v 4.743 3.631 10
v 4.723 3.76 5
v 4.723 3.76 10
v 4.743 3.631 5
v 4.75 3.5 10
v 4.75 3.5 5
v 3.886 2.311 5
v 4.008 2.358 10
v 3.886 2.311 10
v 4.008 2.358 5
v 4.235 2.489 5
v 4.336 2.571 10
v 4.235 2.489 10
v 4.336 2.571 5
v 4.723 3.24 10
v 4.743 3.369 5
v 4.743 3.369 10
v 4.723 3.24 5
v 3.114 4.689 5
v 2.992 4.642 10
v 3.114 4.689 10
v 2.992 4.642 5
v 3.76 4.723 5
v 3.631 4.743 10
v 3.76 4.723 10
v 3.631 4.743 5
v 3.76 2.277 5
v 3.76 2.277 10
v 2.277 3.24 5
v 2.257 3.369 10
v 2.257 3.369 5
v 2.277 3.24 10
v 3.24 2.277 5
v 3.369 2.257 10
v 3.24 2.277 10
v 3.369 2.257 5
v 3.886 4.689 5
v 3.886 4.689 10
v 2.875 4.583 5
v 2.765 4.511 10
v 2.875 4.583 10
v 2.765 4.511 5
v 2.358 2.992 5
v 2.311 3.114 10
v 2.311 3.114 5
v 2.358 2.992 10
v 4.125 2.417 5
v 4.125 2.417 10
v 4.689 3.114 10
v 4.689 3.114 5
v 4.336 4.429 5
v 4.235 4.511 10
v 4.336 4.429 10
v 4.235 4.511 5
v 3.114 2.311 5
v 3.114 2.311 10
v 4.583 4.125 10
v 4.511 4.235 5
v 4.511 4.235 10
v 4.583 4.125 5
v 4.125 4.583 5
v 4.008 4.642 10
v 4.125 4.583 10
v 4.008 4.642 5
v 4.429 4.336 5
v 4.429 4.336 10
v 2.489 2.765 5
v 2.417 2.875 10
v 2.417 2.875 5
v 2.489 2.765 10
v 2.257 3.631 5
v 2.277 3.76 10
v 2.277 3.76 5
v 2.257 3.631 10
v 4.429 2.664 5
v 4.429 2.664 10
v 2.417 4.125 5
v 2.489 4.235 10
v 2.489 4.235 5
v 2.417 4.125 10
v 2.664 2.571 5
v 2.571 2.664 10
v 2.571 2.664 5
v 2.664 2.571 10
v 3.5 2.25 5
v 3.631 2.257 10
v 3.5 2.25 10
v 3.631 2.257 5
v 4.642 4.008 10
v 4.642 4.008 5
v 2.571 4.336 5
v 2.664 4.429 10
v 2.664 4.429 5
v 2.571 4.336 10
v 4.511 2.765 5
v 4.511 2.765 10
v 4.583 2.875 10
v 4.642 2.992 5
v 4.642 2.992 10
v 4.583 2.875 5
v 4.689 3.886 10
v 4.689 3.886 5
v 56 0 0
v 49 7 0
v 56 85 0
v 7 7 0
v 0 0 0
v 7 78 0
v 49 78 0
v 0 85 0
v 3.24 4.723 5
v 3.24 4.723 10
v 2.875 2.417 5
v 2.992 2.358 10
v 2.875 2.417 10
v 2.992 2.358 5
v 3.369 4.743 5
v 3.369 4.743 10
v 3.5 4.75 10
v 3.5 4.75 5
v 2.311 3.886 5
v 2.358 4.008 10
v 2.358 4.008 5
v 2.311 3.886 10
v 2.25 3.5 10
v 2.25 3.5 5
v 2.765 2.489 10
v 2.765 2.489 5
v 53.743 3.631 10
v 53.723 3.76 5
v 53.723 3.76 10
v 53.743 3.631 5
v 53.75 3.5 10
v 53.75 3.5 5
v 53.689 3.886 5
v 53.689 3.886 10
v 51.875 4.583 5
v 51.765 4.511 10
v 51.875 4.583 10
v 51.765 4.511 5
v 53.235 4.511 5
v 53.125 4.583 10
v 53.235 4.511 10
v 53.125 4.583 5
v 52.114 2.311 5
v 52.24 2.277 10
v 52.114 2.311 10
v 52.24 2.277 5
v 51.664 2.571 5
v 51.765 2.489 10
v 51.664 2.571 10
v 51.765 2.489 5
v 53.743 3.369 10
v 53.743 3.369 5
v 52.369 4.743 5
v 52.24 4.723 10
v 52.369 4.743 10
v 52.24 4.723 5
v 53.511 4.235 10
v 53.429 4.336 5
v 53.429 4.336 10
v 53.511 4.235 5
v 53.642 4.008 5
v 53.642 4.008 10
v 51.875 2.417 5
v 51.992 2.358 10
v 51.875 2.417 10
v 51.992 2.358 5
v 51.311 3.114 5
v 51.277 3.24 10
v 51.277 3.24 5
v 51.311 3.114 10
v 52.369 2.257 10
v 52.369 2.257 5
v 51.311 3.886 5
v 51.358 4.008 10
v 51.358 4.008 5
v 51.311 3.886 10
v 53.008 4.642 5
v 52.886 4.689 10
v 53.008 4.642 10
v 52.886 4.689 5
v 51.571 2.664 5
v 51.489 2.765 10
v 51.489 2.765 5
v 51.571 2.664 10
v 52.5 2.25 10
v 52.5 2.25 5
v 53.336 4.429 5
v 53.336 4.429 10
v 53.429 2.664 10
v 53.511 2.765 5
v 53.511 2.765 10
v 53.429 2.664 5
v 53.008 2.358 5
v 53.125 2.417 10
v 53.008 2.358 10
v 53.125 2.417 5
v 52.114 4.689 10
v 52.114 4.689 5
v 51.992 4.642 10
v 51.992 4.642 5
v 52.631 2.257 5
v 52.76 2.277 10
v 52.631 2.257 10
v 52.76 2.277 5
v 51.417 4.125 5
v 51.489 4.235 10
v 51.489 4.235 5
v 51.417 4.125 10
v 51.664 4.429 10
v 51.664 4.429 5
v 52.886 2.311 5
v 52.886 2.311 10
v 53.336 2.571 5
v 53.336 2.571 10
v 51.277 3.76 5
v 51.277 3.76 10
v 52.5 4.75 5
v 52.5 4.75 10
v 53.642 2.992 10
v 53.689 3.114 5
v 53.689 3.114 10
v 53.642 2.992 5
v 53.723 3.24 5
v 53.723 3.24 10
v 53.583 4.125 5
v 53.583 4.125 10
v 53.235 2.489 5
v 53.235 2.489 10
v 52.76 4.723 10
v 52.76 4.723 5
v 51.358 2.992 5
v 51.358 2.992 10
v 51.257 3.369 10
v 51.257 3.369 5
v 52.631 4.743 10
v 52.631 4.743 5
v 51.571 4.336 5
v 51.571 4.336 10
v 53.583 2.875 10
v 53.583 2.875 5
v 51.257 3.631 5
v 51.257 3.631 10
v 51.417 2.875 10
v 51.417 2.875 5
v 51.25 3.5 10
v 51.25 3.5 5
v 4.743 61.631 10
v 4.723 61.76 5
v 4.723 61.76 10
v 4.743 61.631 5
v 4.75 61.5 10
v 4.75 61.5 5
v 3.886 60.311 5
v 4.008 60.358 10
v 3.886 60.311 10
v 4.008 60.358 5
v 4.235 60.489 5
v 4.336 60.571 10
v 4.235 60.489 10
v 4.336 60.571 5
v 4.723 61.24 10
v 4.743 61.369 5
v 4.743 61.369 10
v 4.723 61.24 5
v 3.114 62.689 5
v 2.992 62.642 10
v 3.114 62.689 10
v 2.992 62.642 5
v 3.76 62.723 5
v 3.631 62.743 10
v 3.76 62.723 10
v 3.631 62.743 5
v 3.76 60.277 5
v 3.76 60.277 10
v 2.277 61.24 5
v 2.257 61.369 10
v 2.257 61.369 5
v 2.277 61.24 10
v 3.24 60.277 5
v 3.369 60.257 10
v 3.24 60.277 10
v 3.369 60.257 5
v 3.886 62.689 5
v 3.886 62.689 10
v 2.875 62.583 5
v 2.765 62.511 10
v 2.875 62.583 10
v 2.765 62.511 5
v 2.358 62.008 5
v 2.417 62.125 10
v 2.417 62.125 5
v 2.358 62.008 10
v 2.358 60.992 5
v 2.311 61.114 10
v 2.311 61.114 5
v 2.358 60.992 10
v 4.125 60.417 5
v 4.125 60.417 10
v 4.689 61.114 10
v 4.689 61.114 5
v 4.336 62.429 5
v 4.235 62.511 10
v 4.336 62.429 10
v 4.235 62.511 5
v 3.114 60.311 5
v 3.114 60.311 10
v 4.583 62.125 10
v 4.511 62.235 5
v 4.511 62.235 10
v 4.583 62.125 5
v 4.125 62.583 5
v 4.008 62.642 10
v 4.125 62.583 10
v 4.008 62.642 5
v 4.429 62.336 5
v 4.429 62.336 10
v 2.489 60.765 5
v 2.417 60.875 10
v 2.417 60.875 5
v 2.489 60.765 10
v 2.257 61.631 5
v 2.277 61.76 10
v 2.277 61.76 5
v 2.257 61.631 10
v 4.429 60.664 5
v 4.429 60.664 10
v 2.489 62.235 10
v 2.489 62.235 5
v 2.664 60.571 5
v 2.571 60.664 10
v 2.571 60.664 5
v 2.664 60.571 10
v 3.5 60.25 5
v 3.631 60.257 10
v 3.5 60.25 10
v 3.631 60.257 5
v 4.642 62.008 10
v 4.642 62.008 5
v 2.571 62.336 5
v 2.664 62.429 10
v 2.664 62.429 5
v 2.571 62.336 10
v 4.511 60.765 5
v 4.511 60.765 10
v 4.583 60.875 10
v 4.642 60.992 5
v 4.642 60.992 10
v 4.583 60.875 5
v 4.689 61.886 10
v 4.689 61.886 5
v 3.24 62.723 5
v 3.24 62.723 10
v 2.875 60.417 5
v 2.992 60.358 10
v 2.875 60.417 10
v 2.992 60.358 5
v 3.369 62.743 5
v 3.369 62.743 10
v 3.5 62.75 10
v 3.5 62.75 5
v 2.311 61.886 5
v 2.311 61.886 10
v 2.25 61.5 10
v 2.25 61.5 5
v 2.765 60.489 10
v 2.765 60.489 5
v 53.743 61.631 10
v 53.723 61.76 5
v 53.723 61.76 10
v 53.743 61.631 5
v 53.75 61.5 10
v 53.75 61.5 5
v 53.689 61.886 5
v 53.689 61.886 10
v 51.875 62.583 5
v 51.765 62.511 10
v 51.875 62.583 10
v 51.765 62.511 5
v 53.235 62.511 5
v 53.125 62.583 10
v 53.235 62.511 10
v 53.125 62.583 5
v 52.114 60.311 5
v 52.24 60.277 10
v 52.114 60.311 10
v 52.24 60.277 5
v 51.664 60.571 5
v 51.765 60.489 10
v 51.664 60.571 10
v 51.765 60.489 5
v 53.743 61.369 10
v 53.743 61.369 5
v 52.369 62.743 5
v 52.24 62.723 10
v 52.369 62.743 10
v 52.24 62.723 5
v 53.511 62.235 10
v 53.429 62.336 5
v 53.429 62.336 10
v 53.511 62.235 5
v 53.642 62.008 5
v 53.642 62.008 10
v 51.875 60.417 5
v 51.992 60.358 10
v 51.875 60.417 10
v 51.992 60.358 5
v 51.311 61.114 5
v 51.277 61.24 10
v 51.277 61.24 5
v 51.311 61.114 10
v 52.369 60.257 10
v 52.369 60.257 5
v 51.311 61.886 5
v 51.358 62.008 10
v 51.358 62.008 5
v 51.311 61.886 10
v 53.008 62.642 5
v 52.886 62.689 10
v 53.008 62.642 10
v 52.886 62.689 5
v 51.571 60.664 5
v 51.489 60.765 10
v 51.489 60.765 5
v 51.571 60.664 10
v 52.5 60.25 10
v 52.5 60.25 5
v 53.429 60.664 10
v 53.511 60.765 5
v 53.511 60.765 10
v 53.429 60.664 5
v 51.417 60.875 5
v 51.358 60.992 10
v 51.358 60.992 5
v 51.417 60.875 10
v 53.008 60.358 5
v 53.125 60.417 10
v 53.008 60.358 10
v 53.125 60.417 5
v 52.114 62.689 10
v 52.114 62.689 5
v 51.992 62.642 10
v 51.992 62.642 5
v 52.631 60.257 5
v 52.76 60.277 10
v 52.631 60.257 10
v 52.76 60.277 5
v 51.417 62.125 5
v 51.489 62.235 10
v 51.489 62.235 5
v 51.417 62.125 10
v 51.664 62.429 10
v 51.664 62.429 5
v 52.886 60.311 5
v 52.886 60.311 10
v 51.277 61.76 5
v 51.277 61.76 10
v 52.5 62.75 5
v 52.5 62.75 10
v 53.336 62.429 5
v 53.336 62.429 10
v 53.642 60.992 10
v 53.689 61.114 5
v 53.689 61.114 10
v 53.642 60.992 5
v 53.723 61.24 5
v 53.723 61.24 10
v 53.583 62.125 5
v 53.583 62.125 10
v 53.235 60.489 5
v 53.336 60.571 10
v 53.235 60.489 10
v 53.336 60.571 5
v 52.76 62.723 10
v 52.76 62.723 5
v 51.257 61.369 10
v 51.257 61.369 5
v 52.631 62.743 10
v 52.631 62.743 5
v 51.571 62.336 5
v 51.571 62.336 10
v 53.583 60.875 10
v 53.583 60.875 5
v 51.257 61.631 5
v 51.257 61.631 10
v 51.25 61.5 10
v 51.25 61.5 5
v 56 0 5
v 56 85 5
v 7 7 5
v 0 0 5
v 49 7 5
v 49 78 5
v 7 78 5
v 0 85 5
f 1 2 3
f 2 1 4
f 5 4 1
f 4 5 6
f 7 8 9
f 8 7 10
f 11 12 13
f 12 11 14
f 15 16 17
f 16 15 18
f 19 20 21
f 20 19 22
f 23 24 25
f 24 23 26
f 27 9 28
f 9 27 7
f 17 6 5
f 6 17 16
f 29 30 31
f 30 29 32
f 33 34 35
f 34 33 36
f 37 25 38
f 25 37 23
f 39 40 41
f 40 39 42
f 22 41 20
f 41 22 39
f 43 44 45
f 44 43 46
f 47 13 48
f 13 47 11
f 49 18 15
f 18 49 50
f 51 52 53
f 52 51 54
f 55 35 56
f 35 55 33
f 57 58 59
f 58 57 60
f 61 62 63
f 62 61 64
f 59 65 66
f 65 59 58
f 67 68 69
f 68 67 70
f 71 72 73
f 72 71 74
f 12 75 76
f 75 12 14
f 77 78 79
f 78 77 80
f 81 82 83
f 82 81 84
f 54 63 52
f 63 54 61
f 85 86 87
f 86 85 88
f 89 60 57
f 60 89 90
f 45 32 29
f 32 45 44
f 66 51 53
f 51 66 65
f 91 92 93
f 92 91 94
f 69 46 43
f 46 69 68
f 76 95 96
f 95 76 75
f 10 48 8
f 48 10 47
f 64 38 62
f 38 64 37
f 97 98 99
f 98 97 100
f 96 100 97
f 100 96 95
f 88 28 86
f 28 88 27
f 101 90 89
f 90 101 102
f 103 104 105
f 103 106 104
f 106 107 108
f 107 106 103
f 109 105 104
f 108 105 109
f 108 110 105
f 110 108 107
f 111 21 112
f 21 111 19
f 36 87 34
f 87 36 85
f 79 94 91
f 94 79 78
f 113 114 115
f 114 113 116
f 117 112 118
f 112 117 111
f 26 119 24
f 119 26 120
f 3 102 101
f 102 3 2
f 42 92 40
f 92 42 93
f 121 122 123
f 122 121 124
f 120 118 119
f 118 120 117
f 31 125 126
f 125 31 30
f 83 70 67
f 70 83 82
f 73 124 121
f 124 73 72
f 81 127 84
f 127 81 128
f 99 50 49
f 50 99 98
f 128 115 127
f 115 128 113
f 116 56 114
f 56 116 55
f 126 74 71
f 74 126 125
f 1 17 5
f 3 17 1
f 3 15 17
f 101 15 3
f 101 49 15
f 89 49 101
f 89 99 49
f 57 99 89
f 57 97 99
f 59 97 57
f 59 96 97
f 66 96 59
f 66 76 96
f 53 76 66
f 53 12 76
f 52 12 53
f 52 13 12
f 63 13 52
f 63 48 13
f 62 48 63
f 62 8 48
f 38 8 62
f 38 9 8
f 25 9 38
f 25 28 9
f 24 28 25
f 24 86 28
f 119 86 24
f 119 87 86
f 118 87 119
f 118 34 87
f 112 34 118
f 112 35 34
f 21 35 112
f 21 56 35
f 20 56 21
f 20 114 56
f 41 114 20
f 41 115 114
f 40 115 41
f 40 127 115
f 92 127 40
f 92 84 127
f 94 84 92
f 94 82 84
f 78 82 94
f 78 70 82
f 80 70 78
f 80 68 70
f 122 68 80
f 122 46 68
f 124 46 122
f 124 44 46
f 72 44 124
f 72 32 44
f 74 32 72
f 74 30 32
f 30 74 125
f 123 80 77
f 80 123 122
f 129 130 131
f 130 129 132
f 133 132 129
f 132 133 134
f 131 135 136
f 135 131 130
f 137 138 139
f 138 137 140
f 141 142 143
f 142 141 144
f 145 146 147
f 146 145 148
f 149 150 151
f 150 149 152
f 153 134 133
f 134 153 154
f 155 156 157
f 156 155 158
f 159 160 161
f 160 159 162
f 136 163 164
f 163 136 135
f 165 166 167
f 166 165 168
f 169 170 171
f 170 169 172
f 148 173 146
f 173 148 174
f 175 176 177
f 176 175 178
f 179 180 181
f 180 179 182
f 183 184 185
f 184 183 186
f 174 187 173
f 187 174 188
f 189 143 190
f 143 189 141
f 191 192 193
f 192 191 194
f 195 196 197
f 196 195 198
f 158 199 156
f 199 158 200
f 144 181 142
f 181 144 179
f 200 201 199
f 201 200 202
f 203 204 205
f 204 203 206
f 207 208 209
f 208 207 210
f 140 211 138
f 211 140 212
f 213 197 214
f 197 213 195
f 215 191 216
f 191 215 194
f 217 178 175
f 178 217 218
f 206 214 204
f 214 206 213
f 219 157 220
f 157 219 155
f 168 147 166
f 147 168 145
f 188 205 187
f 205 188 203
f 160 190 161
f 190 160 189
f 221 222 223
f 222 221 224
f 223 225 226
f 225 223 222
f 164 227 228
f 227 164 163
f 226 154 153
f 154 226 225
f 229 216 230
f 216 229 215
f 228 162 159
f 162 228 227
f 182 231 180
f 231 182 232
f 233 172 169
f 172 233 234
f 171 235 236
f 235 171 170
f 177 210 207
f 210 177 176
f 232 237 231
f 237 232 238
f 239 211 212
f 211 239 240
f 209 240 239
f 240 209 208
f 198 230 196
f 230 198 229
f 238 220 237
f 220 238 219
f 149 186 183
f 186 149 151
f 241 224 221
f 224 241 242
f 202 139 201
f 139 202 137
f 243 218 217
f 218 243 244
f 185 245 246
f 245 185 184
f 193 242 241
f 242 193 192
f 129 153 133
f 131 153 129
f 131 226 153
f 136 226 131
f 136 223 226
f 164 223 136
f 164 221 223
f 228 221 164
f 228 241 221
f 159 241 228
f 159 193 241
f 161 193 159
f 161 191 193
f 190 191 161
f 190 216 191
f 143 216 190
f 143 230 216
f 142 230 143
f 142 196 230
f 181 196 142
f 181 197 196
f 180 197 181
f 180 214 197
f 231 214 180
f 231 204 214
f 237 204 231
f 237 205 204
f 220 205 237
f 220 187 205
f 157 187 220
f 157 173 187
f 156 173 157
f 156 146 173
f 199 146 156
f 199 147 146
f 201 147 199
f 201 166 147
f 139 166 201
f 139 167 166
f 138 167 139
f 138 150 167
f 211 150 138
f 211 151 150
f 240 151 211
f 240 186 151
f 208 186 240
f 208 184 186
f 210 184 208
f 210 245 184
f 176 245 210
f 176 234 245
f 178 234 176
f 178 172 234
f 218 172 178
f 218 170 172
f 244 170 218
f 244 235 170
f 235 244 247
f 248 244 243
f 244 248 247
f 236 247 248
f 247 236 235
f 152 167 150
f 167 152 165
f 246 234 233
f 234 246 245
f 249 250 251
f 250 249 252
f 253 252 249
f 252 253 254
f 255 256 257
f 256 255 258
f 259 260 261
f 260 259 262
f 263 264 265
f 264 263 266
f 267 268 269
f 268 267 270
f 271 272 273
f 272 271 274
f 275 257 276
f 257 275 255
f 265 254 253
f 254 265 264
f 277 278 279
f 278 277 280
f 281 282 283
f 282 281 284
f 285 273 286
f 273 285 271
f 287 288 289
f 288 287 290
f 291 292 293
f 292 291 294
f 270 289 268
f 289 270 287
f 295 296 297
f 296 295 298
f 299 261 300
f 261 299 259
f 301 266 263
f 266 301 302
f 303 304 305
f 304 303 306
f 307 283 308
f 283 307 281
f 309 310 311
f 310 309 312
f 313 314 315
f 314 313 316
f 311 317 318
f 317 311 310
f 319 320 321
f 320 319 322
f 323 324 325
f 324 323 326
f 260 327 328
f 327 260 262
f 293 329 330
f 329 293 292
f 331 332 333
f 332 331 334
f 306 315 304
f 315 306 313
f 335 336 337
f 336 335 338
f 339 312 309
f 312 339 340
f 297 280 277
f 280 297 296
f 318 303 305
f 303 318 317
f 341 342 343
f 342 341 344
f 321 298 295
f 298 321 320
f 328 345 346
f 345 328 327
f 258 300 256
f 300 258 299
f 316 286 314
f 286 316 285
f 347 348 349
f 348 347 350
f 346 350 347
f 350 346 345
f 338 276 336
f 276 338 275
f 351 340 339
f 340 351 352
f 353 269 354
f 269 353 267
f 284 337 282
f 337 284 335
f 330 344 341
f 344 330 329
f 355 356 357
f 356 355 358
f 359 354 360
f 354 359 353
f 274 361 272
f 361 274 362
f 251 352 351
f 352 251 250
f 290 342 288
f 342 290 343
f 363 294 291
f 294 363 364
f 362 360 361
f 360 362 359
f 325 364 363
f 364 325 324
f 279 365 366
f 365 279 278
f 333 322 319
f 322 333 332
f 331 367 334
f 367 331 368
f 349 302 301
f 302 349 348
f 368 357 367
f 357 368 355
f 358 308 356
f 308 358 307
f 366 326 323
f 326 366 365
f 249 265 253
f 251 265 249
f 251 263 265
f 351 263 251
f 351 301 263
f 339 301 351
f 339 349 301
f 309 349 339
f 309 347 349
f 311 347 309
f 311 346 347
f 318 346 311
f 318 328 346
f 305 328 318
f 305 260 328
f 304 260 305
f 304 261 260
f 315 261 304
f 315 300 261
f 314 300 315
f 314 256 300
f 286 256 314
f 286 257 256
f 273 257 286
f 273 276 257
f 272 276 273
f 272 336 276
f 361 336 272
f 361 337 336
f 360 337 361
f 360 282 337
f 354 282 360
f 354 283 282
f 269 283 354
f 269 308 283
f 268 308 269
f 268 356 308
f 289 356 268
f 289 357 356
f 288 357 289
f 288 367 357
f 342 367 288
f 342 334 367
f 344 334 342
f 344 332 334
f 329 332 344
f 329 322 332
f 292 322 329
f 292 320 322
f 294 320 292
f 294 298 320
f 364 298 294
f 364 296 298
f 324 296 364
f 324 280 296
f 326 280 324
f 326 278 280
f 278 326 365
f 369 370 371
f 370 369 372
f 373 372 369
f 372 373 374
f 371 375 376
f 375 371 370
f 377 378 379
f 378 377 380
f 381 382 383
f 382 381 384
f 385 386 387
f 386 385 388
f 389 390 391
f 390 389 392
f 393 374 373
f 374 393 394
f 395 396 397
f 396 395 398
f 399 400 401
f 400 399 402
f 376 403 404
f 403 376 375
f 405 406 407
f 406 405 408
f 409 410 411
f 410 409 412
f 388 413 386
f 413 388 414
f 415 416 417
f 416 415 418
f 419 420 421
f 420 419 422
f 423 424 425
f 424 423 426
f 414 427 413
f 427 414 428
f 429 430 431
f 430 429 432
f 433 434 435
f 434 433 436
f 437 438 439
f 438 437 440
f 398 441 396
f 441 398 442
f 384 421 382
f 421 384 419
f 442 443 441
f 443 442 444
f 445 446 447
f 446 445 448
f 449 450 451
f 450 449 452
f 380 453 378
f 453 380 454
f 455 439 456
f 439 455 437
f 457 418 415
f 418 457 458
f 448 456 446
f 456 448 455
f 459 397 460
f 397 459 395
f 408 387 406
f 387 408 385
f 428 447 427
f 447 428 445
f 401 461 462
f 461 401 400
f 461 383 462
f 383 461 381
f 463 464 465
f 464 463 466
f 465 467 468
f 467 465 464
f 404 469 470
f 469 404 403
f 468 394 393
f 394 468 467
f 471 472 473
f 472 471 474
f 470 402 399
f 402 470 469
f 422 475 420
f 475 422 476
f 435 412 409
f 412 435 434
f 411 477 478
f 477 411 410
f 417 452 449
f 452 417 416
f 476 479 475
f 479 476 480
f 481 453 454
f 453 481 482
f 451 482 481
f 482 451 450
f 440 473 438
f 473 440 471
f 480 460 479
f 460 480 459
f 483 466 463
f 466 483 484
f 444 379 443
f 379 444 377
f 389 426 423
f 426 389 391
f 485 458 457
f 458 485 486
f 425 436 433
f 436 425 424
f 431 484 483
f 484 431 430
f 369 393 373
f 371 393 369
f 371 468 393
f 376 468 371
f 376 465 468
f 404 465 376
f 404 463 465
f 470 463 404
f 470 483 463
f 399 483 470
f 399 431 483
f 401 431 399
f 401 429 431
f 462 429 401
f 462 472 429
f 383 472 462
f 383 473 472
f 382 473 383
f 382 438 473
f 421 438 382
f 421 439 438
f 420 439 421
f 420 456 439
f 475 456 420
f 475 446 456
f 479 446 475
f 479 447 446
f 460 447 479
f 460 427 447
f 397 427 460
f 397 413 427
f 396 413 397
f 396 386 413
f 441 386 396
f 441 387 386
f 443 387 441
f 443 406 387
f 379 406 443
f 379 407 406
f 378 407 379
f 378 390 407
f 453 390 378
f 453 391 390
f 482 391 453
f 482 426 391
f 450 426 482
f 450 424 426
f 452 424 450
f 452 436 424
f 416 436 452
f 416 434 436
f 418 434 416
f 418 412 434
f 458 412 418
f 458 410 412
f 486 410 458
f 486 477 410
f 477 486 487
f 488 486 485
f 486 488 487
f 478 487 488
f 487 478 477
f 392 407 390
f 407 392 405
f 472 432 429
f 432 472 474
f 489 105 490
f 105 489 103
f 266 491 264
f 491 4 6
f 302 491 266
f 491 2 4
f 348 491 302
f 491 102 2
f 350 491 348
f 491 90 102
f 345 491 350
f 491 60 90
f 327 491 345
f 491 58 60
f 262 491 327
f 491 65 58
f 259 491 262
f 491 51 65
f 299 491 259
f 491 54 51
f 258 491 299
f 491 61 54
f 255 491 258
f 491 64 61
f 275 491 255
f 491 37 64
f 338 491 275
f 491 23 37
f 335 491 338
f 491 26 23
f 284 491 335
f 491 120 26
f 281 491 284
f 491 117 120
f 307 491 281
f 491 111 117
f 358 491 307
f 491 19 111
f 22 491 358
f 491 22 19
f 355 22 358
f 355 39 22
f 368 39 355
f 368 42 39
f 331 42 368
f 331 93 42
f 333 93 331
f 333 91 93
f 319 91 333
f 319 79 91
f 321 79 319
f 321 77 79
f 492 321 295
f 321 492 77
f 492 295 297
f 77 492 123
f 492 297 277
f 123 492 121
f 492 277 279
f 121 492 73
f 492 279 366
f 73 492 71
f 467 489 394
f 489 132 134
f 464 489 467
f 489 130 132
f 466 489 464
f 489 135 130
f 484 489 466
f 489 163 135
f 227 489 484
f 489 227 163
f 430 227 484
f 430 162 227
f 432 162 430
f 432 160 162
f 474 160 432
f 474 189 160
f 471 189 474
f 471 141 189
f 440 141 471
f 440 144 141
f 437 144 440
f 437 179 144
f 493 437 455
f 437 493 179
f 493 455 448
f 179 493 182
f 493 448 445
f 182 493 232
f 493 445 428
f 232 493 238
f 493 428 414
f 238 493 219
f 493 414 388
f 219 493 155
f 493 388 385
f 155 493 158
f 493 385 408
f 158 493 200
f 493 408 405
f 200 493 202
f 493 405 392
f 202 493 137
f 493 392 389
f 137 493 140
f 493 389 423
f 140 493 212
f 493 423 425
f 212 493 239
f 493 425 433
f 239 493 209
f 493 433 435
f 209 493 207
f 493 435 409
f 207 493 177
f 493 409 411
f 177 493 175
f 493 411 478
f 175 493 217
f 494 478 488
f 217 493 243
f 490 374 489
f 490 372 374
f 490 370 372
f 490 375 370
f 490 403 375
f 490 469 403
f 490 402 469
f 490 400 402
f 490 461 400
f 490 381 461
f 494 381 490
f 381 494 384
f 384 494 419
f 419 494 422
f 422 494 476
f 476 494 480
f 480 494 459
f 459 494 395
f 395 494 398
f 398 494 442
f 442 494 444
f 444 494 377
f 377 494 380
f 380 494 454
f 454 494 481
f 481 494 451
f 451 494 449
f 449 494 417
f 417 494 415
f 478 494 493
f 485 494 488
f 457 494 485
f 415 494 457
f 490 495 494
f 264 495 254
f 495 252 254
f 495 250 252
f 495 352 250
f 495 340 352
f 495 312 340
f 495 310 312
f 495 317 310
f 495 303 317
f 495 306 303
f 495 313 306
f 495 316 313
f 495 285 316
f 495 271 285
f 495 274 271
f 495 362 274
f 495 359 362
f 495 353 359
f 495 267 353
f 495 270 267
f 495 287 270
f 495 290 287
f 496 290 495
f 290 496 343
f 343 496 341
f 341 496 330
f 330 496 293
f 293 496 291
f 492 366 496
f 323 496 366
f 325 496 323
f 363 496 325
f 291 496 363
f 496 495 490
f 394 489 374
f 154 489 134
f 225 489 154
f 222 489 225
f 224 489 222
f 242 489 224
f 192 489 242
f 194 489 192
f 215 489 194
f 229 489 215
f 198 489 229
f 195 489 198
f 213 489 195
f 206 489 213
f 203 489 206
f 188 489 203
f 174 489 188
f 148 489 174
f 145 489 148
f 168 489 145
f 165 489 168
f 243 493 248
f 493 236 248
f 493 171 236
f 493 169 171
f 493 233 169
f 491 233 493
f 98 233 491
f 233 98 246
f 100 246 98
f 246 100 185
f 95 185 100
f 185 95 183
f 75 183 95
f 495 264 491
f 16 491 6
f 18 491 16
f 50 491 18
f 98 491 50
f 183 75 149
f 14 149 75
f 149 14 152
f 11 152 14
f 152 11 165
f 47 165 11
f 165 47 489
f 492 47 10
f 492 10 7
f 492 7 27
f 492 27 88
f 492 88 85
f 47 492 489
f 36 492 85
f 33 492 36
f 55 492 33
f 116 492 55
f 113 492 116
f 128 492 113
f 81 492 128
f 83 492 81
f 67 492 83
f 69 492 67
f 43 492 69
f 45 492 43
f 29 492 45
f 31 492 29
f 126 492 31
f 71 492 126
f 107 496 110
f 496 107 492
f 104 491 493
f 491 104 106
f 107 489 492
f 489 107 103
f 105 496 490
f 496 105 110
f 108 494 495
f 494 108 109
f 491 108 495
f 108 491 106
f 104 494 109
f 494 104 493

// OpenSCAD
$fn=60;
// RPI backplate
cube([56,7,5]);
translate([3.5,3.5,0]) {
  cylinder(h=10, r=1.25);
  translate([49,0,0]) {
    cylinder(h=10, r=1.25);
  }
}
translate([0,78,0]){
  cube([56,7,5]);
}
translate([0,58,0]) {
  translate([3.5,3.5,0]) {
    cylinder(h=10, r=1.25);
    translate([49,0,0]) {
      cylinder(h=10, r=1.25);
    }
  }
}

cube([7,85,5]);
translate([49,0,0]) 
cube([7,85,5]);
